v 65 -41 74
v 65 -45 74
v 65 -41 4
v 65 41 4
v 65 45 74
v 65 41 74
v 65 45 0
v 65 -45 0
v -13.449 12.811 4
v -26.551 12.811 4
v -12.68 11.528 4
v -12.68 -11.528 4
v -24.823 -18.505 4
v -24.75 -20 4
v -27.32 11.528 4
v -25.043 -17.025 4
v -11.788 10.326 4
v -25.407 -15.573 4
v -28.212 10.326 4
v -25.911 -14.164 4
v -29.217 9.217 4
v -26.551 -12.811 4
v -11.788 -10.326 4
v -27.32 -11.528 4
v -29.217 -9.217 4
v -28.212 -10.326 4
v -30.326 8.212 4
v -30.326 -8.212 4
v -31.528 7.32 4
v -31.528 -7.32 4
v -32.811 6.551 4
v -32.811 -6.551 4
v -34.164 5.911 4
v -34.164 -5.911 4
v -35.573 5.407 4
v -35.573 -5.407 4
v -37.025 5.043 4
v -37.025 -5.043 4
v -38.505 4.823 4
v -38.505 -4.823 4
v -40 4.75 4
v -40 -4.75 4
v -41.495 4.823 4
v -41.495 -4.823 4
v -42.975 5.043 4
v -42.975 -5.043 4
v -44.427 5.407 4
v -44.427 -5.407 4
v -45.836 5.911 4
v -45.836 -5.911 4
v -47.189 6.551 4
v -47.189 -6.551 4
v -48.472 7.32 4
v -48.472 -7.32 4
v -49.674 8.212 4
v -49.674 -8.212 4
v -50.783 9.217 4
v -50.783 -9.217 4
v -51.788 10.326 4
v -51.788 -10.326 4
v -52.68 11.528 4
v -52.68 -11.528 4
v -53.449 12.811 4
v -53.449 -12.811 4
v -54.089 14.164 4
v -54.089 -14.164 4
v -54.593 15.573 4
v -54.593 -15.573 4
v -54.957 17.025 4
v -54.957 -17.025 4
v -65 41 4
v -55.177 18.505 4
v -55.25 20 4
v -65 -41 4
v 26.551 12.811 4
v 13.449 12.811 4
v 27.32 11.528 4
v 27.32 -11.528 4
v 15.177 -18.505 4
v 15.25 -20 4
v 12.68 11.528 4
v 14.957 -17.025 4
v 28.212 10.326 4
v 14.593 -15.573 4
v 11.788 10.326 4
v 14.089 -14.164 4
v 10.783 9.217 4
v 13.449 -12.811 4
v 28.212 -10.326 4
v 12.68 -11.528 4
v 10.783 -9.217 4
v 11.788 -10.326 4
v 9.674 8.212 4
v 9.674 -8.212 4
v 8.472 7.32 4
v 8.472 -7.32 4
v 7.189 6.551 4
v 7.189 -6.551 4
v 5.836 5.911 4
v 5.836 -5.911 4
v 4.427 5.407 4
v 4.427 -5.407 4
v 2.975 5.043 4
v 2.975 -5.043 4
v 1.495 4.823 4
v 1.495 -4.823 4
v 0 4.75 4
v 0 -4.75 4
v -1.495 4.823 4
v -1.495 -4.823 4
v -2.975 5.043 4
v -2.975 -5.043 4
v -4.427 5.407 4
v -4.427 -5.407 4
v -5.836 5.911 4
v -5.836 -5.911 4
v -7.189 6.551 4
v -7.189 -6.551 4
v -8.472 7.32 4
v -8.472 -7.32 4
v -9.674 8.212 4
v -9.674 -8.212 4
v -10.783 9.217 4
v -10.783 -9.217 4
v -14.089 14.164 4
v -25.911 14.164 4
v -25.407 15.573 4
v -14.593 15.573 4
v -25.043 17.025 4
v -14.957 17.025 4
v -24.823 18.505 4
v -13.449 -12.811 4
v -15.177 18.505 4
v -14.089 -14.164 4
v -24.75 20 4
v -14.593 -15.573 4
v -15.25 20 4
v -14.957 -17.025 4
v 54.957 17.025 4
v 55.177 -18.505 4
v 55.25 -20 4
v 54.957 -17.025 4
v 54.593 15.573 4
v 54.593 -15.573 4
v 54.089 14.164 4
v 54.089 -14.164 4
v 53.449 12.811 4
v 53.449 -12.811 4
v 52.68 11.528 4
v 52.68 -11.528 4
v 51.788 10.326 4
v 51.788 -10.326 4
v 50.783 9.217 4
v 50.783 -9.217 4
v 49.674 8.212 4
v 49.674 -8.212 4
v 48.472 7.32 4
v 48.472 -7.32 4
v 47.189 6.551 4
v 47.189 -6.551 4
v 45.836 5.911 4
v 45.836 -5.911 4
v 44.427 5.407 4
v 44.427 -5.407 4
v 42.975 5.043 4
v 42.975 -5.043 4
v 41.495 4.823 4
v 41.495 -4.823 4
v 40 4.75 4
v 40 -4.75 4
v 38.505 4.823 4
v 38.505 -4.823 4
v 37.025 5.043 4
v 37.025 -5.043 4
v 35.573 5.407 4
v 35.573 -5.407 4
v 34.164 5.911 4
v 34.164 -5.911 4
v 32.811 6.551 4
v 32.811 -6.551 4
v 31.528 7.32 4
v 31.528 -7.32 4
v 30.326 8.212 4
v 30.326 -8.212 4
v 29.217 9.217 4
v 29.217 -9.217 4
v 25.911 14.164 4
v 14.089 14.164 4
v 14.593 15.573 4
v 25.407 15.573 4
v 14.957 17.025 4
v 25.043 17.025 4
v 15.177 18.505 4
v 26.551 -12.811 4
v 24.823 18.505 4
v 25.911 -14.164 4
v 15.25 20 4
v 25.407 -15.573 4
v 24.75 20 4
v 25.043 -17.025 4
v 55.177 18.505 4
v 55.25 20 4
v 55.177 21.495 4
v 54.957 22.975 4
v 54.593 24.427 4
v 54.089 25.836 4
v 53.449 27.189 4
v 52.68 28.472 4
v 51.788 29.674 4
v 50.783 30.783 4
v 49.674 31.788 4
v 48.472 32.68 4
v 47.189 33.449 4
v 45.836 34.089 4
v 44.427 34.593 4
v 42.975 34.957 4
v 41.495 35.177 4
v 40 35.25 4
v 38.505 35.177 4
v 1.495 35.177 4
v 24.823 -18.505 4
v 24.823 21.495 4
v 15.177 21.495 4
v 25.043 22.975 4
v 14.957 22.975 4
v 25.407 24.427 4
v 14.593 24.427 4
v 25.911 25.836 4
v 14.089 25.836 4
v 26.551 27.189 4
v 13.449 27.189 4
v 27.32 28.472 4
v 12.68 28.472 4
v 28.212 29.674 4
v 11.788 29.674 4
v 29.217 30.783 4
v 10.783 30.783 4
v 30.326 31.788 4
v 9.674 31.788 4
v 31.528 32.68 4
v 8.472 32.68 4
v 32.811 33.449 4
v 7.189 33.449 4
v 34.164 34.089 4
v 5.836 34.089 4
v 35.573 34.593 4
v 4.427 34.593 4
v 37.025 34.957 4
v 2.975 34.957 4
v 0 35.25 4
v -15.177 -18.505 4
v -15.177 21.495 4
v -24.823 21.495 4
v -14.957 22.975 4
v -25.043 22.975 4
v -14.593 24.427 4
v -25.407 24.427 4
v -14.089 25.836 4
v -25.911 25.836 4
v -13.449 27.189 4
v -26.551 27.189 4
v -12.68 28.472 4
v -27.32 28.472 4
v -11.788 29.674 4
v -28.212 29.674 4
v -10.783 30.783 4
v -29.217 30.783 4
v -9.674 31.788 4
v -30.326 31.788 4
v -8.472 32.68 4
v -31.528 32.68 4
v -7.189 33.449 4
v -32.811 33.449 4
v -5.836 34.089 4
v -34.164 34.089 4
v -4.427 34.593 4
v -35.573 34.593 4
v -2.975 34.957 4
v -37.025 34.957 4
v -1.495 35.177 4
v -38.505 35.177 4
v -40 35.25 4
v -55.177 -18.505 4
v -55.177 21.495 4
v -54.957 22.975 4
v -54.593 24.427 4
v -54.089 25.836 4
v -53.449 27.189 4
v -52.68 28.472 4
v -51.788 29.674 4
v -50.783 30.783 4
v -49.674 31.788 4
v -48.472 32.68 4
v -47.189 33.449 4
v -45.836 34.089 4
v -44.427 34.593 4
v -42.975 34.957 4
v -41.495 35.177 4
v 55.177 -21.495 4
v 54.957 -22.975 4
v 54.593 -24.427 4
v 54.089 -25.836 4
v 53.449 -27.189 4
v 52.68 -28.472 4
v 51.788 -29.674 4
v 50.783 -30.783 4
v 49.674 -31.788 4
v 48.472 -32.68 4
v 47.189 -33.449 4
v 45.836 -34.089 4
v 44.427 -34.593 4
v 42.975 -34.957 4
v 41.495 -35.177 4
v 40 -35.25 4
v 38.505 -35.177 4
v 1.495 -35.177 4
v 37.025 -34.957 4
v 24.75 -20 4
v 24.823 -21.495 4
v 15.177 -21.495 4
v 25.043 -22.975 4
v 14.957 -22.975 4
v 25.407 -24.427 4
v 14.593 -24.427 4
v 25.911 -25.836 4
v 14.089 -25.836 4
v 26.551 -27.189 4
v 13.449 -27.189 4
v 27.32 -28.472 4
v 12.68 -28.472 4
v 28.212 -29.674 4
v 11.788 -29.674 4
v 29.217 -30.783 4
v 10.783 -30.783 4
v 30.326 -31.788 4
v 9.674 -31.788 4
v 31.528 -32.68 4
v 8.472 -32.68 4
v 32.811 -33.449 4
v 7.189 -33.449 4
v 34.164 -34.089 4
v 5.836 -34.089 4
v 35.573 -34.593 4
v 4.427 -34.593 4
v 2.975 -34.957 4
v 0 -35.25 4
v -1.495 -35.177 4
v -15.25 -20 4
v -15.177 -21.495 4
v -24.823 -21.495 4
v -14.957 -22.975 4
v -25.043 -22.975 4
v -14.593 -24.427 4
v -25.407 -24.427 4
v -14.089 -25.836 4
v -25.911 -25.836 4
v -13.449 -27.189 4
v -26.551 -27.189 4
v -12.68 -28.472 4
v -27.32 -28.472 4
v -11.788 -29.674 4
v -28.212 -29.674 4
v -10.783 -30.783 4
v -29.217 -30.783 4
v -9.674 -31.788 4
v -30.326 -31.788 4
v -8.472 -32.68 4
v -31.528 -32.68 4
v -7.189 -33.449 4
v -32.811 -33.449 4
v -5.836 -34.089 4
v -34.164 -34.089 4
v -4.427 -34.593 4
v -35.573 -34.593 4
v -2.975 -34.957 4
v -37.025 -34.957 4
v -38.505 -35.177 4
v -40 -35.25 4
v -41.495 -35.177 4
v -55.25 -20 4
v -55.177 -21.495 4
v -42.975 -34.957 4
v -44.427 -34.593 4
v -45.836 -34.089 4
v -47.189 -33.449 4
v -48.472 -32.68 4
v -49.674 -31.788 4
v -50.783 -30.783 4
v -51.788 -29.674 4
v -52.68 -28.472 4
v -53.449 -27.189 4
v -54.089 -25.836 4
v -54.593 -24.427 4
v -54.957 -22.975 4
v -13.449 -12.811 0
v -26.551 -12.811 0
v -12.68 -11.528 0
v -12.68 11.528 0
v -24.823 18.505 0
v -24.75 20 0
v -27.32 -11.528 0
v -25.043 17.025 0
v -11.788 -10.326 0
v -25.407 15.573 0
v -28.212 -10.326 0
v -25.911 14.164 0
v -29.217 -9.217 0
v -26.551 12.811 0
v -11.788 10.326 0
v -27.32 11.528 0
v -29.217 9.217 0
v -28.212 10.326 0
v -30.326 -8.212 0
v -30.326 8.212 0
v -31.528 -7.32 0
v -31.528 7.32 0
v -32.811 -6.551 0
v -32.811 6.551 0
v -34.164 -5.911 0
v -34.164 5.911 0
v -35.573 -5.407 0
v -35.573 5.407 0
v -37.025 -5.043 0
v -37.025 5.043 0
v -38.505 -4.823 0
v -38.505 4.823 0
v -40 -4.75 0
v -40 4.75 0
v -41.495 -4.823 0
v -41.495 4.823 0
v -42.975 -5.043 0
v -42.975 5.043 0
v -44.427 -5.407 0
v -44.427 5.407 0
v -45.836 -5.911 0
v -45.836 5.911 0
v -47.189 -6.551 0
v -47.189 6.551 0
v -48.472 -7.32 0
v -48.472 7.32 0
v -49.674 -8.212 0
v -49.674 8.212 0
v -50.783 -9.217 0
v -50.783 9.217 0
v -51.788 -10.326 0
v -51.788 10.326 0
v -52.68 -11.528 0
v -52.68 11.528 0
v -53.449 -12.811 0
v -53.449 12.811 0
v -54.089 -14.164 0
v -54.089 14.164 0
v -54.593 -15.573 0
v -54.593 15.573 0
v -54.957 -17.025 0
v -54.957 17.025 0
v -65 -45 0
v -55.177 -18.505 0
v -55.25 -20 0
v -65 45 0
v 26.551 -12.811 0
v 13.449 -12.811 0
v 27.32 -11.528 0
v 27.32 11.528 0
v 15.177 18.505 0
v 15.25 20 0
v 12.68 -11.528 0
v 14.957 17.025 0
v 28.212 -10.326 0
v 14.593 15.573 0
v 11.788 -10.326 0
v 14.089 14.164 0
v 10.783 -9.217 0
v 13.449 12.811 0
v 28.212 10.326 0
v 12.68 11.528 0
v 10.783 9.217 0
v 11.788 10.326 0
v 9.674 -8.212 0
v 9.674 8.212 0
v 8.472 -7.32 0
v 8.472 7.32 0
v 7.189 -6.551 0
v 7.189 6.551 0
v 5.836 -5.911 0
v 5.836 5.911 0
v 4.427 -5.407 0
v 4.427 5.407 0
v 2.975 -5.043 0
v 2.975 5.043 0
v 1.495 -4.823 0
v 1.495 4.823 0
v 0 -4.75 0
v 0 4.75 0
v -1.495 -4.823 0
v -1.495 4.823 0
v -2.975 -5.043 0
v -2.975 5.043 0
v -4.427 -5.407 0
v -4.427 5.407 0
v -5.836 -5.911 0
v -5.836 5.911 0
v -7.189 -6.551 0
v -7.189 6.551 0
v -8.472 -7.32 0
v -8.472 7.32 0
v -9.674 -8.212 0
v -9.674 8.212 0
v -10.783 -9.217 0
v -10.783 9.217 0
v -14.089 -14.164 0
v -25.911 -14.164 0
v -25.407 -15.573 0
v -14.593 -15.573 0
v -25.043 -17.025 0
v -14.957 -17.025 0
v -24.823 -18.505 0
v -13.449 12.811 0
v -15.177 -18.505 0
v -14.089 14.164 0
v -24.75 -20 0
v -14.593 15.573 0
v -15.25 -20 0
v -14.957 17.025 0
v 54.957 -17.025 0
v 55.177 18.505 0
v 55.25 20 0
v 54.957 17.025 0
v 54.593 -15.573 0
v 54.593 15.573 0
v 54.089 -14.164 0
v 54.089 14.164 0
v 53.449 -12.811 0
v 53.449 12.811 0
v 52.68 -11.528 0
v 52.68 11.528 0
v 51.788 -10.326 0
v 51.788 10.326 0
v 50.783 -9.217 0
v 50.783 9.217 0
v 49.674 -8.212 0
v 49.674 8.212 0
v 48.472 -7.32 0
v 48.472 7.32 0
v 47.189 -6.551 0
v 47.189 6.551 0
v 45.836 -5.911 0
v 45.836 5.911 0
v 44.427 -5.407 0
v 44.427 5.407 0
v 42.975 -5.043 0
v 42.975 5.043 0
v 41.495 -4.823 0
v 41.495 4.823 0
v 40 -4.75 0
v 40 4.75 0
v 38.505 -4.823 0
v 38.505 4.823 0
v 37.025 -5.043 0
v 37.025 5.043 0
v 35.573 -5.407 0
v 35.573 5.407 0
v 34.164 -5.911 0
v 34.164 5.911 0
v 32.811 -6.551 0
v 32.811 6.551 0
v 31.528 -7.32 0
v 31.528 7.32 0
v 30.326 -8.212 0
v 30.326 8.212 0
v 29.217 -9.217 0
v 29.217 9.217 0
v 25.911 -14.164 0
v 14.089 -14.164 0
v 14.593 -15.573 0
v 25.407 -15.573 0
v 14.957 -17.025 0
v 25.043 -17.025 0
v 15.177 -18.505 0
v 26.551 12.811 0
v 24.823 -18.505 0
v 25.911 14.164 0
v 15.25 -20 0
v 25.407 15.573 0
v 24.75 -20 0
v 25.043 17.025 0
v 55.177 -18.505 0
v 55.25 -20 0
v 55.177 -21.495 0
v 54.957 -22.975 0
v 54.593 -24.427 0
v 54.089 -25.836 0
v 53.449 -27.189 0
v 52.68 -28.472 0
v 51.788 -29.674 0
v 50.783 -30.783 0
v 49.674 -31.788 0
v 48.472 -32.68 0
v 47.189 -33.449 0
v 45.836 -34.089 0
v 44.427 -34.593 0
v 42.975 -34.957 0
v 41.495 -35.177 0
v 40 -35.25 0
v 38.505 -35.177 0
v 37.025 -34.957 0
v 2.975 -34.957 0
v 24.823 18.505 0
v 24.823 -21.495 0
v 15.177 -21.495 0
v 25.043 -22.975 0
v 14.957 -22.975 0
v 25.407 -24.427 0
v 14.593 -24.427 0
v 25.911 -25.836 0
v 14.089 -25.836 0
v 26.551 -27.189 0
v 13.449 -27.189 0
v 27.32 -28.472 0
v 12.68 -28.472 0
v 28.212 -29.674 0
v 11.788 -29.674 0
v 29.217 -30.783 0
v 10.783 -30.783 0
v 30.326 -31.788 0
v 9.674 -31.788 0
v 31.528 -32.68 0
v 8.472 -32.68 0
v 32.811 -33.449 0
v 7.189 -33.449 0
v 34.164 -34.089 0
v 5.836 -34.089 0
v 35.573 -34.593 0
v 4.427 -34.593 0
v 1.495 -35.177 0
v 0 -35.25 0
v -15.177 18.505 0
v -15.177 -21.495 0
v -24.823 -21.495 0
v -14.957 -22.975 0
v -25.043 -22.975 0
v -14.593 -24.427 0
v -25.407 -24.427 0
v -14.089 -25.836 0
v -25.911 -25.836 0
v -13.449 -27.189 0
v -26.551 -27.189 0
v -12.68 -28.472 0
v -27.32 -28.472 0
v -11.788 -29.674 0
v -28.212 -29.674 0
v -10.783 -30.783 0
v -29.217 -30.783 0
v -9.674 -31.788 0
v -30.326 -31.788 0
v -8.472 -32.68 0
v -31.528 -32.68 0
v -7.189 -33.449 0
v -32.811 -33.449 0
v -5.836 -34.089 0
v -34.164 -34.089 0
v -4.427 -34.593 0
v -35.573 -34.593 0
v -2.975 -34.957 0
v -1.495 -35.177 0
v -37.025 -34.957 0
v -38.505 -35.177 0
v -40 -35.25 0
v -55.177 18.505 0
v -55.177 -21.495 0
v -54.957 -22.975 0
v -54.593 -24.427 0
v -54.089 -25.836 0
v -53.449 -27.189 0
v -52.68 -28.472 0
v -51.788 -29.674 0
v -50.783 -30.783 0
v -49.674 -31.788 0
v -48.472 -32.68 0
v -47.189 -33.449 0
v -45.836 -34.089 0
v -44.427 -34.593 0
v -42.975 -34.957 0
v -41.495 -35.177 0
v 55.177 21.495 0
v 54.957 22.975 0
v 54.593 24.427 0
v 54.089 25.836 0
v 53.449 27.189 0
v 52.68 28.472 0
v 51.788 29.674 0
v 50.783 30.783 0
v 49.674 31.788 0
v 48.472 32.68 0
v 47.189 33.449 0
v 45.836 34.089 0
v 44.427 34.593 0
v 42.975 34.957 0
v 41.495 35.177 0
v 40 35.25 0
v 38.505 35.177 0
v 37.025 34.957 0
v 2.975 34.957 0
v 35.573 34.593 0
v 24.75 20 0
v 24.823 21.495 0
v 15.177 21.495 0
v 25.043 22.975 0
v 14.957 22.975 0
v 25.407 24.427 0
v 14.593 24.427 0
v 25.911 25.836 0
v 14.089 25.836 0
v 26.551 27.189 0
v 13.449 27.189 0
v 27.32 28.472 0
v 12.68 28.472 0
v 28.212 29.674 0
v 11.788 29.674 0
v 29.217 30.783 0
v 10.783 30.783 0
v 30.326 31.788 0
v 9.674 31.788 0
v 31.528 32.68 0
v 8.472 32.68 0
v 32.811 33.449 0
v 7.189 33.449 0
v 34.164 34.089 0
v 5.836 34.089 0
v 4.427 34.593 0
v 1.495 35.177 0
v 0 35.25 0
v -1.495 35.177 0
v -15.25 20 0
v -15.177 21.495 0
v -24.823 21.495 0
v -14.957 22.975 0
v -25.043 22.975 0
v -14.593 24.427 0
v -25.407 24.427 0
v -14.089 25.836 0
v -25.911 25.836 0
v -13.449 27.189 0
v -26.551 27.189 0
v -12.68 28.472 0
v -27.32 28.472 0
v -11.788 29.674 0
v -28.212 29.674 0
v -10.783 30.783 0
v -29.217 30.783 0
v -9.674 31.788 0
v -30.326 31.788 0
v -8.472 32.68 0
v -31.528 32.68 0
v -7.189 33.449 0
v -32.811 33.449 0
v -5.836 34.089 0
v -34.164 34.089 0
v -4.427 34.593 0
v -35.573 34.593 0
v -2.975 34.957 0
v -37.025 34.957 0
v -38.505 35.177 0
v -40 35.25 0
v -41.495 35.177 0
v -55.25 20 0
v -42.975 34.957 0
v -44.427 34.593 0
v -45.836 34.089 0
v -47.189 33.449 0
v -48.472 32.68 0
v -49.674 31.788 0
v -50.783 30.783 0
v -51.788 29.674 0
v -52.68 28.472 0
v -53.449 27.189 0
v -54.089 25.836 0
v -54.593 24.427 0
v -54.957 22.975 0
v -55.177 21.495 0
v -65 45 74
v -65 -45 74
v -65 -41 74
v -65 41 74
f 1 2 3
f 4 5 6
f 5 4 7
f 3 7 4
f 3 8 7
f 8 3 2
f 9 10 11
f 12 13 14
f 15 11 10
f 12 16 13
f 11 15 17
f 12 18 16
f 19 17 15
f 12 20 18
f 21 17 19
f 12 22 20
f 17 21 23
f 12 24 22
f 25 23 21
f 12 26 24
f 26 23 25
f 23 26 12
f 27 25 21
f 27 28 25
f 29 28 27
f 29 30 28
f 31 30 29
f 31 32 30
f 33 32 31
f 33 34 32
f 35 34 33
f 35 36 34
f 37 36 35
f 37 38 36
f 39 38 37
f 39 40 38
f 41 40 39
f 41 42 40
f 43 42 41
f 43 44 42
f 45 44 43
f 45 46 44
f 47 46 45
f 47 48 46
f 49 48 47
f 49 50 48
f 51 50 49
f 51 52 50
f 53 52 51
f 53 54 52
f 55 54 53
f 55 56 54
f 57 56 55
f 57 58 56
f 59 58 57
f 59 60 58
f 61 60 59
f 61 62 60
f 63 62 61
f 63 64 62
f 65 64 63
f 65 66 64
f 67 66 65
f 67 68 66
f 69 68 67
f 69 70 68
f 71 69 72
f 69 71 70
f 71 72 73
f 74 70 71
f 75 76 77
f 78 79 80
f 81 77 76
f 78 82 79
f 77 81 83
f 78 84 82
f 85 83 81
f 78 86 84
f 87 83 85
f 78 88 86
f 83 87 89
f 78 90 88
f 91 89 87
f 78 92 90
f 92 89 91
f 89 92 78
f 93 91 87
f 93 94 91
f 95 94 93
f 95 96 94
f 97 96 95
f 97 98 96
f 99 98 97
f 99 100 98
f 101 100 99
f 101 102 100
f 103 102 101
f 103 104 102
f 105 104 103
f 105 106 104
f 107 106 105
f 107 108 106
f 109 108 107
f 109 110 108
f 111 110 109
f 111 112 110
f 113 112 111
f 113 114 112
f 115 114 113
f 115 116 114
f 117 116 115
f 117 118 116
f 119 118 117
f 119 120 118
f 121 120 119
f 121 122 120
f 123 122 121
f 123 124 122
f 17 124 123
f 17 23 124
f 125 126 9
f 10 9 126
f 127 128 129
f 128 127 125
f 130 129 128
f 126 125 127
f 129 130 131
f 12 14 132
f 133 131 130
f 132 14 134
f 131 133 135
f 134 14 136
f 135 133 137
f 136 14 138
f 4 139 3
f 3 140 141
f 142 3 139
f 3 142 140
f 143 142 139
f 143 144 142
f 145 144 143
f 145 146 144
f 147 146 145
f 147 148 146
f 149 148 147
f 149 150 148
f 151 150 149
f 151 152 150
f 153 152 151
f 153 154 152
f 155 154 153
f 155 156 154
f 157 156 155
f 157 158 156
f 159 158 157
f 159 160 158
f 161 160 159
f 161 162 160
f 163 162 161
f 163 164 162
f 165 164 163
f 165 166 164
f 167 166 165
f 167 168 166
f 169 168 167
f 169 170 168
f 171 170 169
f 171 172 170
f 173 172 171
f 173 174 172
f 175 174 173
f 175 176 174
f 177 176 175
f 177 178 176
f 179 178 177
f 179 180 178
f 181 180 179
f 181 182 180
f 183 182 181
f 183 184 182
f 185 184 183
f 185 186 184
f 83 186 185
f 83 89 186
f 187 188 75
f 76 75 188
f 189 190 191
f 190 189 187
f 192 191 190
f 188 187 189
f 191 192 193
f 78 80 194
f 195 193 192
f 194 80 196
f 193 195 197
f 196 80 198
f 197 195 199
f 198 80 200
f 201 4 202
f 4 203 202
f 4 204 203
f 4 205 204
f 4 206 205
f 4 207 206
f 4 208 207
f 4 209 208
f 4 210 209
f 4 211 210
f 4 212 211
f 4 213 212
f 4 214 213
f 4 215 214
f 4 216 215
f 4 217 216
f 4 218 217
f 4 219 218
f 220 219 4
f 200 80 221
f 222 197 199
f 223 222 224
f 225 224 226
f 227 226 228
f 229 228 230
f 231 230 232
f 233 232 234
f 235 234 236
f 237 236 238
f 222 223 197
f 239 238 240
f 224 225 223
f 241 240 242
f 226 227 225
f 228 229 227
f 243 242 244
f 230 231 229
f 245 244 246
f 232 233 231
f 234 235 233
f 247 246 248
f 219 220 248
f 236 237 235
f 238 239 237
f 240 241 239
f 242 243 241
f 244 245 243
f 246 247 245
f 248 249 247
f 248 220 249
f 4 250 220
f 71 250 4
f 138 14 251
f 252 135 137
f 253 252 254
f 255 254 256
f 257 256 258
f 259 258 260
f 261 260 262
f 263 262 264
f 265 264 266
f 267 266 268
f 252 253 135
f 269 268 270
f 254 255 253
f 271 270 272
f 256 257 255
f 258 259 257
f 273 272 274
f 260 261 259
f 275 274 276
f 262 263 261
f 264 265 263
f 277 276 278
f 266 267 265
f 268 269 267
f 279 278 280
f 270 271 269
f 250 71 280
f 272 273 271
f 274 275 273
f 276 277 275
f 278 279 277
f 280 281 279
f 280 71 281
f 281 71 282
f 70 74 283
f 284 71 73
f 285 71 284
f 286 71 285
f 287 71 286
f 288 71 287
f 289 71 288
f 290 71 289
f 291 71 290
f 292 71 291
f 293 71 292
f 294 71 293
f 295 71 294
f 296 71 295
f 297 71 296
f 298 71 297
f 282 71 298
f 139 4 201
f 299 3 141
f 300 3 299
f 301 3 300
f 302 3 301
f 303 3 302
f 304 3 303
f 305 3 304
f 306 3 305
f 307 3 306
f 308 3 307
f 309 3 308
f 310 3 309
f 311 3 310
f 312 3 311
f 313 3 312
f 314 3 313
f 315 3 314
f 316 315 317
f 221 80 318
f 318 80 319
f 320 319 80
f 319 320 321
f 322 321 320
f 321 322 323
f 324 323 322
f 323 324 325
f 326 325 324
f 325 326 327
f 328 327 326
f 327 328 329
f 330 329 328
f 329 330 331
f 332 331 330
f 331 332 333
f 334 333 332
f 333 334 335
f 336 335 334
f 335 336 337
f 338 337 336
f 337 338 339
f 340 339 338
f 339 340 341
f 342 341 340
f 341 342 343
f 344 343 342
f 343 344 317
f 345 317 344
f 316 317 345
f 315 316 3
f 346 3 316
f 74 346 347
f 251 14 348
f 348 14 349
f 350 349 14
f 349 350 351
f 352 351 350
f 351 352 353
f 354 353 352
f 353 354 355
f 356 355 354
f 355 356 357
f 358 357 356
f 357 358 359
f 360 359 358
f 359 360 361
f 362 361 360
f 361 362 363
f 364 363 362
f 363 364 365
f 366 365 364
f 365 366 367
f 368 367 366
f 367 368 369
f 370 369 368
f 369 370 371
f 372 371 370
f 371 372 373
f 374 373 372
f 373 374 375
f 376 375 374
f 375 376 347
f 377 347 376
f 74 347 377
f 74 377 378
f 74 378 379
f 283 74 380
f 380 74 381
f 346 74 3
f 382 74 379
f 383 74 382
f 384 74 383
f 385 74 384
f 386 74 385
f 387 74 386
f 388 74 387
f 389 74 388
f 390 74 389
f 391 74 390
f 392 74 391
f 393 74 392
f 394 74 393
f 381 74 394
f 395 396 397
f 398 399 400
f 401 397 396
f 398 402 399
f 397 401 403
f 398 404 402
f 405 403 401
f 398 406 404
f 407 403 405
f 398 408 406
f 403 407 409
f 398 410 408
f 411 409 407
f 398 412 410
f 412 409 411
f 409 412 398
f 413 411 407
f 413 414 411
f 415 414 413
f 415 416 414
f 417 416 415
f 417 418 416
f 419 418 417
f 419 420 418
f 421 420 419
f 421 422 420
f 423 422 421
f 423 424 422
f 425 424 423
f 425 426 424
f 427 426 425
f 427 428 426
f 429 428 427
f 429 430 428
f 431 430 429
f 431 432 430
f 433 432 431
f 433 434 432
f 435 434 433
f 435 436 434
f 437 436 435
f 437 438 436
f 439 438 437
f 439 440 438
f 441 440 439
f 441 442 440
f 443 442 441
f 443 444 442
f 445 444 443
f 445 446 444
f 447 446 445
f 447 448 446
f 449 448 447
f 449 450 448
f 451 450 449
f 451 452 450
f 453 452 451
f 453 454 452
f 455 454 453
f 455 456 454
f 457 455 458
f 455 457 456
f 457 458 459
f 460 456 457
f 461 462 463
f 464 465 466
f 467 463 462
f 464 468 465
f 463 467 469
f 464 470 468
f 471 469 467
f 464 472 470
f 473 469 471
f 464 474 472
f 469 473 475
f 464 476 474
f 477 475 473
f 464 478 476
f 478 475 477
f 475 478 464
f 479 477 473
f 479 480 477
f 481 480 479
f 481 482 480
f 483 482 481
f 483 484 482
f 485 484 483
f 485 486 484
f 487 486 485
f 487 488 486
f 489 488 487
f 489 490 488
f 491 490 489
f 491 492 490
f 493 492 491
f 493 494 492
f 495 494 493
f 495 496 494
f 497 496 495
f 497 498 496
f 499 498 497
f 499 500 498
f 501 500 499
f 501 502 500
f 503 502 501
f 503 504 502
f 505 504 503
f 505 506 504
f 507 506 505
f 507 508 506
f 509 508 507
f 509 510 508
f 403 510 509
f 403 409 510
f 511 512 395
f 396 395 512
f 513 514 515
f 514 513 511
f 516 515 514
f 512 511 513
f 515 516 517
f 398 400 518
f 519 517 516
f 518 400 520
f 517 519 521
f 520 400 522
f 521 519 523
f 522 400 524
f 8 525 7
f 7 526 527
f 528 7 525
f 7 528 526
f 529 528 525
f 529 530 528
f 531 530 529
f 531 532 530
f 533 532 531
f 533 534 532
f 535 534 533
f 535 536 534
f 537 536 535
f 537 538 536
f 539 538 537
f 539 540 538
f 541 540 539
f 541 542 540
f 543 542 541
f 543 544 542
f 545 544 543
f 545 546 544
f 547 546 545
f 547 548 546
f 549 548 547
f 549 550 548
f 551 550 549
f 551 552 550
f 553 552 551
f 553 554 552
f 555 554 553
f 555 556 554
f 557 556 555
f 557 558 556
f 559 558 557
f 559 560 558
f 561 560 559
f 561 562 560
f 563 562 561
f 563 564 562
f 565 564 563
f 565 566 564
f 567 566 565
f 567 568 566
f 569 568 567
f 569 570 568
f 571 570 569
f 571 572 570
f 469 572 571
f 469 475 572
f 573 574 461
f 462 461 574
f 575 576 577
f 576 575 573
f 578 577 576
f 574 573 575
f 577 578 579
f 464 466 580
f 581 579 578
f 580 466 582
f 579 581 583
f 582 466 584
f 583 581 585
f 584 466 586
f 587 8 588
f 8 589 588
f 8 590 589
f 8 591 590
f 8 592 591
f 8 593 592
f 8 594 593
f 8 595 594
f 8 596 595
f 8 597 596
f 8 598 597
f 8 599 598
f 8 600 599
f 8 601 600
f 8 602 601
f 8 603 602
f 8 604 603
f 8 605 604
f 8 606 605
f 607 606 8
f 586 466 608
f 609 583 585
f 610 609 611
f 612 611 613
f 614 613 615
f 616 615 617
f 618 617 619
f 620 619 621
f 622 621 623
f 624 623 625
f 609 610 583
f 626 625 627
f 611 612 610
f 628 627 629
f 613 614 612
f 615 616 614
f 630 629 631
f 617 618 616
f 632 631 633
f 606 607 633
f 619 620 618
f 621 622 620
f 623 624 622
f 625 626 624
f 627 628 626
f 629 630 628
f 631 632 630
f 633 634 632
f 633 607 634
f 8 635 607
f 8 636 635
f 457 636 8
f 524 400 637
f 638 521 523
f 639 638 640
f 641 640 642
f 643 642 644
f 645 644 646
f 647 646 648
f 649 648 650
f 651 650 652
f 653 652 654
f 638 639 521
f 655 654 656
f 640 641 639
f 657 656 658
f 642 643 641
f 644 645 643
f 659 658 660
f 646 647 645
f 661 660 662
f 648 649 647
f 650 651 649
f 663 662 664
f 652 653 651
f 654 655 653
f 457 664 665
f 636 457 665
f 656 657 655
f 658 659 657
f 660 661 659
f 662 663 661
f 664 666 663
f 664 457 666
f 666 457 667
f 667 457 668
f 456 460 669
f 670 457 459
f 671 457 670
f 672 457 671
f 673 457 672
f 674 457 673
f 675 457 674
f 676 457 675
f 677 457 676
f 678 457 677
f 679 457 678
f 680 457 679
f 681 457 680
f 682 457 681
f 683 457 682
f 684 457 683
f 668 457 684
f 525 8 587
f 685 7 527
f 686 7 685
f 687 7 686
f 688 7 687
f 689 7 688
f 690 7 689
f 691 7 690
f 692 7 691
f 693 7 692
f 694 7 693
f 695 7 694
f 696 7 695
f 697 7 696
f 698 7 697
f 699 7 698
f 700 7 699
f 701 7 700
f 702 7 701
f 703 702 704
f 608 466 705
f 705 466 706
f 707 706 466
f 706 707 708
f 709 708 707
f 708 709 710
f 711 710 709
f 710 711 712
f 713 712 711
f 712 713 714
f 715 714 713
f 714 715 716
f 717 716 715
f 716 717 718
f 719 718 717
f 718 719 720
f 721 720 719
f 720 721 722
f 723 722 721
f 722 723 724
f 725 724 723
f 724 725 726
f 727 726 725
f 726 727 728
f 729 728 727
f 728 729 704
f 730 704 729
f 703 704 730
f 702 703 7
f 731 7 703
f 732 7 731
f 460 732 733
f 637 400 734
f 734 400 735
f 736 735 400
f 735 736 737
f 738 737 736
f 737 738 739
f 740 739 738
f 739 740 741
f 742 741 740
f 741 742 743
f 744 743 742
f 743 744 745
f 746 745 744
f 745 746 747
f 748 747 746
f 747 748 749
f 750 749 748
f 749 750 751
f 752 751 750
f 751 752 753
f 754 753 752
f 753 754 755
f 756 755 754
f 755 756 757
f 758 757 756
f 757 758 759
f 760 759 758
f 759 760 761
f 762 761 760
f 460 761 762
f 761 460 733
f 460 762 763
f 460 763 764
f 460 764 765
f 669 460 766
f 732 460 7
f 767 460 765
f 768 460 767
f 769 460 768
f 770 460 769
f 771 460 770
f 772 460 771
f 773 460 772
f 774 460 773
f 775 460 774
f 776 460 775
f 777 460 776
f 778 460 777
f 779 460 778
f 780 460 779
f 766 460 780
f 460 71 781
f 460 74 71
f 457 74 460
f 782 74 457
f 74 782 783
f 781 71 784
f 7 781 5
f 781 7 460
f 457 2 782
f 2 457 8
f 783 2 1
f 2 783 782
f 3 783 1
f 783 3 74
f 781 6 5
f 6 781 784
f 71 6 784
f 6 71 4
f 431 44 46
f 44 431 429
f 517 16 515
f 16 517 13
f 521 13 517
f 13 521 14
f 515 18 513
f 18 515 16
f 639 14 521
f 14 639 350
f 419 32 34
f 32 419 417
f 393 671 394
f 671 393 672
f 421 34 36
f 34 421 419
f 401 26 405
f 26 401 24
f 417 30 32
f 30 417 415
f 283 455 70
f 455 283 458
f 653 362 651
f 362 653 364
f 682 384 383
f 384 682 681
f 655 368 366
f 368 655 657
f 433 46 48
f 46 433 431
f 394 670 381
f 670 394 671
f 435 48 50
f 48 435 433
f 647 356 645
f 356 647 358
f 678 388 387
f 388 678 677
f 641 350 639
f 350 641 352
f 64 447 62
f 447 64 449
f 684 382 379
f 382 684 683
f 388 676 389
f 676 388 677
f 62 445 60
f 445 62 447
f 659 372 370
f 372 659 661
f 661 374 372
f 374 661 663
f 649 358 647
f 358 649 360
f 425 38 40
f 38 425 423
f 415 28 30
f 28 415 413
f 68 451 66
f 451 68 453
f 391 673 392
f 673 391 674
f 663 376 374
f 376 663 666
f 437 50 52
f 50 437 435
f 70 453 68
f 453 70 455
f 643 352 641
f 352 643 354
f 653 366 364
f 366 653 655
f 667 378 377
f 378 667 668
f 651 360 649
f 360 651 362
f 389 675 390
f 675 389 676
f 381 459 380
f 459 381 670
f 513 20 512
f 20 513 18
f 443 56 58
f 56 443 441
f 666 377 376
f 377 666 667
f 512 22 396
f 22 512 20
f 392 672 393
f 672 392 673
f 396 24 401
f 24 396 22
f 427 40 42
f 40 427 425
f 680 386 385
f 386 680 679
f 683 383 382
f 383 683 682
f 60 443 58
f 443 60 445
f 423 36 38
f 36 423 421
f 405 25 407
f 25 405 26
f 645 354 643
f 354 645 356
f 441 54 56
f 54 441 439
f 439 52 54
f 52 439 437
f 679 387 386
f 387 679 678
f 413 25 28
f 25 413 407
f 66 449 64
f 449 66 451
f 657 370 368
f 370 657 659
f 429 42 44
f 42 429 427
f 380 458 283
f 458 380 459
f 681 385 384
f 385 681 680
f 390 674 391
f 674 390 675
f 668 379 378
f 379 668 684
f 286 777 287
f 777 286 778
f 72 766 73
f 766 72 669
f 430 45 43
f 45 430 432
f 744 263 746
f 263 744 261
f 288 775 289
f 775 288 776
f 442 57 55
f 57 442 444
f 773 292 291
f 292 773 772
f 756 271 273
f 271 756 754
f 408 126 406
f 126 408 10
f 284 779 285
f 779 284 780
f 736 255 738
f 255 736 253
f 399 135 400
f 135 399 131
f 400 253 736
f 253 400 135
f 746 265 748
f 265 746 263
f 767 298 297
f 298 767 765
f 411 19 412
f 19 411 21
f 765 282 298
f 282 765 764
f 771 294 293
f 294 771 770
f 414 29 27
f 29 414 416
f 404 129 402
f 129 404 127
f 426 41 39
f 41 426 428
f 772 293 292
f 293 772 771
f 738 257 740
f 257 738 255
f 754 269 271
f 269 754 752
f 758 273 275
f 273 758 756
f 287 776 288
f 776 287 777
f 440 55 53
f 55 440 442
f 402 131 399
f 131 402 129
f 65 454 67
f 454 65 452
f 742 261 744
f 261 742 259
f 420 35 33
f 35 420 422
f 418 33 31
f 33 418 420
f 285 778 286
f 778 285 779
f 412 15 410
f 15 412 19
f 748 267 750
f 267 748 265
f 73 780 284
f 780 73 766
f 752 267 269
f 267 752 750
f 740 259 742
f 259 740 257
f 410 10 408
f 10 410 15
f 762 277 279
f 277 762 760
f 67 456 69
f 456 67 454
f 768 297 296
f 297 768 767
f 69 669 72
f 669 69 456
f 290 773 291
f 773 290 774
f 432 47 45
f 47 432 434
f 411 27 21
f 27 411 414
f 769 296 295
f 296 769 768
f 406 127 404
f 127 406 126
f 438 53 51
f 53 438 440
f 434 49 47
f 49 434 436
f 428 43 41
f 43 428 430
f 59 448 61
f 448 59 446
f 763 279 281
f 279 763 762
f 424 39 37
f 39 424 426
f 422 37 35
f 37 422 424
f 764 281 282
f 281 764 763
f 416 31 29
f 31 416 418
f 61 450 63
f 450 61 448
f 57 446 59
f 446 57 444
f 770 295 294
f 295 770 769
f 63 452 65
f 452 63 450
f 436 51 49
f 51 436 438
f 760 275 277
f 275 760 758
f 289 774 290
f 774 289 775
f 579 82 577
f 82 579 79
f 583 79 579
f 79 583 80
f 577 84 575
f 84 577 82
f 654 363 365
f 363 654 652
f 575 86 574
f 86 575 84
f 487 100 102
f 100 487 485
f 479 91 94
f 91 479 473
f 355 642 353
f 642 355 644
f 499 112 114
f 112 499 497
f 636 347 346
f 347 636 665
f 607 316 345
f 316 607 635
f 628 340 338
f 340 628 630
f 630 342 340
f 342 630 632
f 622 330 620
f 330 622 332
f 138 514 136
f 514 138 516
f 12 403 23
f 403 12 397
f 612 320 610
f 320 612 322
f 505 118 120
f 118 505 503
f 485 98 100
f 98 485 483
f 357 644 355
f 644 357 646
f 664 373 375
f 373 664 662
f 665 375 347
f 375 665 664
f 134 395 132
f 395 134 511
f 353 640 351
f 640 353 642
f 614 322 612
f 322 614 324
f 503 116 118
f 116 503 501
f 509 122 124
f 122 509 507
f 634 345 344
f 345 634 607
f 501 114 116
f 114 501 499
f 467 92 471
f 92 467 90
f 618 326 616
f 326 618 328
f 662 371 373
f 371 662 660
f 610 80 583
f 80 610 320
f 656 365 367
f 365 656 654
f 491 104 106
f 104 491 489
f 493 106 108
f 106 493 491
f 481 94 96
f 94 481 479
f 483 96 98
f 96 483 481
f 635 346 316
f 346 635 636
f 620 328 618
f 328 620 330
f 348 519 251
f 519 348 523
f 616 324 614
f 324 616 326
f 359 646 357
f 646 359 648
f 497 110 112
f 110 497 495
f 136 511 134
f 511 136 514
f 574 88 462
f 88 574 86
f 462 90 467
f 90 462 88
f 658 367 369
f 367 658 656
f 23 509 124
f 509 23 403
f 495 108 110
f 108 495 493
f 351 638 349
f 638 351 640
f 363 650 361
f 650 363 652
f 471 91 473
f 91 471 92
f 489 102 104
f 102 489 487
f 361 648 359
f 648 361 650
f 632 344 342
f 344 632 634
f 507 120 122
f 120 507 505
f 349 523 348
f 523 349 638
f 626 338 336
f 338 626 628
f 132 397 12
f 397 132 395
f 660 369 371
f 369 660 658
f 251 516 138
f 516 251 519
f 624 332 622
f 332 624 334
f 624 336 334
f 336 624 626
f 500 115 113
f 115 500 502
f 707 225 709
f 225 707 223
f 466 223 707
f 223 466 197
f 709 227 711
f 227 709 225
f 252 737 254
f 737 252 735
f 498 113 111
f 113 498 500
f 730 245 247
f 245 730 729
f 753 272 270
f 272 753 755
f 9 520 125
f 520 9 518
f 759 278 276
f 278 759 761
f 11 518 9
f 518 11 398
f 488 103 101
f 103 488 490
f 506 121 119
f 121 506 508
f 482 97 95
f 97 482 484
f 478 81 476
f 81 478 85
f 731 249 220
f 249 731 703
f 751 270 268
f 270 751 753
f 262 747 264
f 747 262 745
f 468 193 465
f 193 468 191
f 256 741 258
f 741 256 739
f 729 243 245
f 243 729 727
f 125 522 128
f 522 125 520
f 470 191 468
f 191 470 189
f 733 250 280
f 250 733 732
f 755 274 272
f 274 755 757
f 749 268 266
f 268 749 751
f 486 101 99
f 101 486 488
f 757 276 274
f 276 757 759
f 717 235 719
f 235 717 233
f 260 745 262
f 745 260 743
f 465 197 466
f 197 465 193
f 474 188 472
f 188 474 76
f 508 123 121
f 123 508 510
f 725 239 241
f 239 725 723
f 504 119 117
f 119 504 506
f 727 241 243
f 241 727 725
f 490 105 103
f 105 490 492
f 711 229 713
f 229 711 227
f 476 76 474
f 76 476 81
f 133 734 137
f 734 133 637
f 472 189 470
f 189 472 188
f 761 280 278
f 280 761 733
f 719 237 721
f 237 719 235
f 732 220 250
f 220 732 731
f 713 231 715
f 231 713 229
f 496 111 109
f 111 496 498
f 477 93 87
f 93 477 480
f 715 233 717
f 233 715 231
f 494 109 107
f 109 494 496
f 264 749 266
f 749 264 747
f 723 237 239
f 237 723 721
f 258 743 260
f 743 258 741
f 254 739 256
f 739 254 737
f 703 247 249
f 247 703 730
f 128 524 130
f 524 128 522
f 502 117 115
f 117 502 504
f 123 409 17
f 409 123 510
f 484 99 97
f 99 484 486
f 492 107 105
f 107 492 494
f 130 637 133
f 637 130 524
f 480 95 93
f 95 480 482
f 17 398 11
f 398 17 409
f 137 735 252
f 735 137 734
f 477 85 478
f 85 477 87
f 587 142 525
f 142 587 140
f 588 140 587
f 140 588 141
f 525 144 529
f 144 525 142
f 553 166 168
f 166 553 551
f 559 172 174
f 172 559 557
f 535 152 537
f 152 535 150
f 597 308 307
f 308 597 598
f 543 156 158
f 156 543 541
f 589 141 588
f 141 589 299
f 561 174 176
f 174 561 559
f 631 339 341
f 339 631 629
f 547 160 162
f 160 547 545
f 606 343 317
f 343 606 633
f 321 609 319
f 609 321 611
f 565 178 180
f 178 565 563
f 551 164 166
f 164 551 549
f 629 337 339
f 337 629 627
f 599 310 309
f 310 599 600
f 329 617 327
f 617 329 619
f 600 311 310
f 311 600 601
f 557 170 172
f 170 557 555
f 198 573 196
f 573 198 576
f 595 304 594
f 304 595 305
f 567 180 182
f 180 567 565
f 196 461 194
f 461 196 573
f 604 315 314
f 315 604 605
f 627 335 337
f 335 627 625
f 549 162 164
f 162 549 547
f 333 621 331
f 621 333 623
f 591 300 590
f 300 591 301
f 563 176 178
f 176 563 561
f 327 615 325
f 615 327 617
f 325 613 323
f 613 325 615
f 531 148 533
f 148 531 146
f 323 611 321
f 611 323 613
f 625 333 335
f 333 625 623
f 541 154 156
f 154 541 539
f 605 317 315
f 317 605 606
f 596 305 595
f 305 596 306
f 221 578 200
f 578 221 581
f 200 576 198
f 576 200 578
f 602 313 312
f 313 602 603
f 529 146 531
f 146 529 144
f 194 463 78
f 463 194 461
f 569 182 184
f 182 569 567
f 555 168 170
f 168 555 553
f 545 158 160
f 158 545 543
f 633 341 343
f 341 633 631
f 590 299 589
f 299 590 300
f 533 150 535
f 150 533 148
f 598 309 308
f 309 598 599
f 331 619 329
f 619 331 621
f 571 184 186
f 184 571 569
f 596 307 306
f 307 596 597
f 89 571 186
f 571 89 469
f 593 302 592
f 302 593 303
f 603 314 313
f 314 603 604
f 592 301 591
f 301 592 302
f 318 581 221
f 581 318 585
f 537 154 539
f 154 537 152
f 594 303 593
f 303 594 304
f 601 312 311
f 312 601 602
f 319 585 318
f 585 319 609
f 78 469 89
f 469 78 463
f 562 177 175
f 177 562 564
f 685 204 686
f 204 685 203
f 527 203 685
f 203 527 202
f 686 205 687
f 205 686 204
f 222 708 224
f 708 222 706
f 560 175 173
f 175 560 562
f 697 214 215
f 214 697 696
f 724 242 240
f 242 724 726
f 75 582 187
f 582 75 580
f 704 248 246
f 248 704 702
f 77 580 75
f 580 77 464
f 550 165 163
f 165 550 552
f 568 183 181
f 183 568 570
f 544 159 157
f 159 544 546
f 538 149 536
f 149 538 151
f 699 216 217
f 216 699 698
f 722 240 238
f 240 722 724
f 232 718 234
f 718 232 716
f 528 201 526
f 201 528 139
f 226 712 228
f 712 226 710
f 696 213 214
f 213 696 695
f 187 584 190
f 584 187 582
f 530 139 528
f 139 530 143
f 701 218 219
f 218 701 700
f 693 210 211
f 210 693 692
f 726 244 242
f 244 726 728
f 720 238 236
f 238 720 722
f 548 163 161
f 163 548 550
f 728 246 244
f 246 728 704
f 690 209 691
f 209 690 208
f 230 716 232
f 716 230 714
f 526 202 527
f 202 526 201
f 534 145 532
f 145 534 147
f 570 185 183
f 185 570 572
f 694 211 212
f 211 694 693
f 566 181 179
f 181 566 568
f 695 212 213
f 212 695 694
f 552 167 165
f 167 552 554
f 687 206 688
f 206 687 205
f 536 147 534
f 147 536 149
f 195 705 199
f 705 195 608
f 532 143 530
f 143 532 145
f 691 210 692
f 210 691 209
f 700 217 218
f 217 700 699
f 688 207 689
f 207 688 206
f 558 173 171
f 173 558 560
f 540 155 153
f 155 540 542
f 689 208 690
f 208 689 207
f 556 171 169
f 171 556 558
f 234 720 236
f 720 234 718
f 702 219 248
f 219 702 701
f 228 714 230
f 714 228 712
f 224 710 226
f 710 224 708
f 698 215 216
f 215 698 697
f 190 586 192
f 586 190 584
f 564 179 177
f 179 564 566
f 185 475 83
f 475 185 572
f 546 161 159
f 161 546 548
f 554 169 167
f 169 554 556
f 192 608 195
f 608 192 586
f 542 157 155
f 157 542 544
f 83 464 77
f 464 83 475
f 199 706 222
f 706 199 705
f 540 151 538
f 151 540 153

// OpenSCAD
// --- Dimensions (mm) ---
plate_width = 130;          // X dimension of the base plate
plate_depth = 90;           // Y dimension of the base plate
plate_thickness = 4;        // Thickness of the base plate
wall_height = 70;           // Height of the side walls (from the top of the plate)
wall_thickness = 4;         // Thickness of the side walls
hole_diameter = 30.5;       // Diameter of the tube holes
hole_spacing_x = 40;        // Center-to-center distance along X
hole_spacing_y = 40;        // Center-to-center distance along Y
num_holes_x = 3;            // Number of holes along X axis
num_holes_y = 2;            // Number of holes along Y axis

// --- Resolution ---
$fn = 64;

// --- Construction ---

// The part is designed to be printed "upside down" relative to its final use.
// In print orientation: 
// The plate is at Z=0 to Z=4.
// The walls rise from Z=4 to Z=74 (4 + 70).
// The holes are cut through the plate.

module tube_rack() {
    difference() {
        // Main Body: The plate and the two side walls
        union() {
            // The Base Plate
            // Centered on X and Y as per instructions
            translate([-plate_width/2, -plate_depth/2, 0])
                cube([plate_width, plate_depth, plate_thickness]);
            
            // Wall 1 (along one long edge)
            // Flush with the long edge (Y = -plate_depth/2)
            translate([-plate_width/2, -plate_depth/2, plate_thickness])
                cube([plate_width, wall_thickness, wall_height]);
            
            // Wall 2 (along the other long edge)
            // Flush with the long edge (Y = plate_depth/2 - wall_thickness)
            translate([-plate_width/2, plate_depth/2 - wall_thickness, plate_thickness])
                cube([plate_width, wall_thickness, wall_height]);
        }

        // The Holes
        // Grid center is at (0, 0) because the plate is centered on the origin.
        // Offset calculation: (Total_spacing - (count-1)*spacing) / 2
        // Since we are centered on origin, we calculate the start position relative to 0.
        
        start_x = -( (num_holes_x - 1) * hole_spacing_x ) / 2;
        start_y = -( (num_holes_y - 1) * hole_spacing_y ) / 2;

        for (i = [0 : num_holes_x - 1]) {
            for (j = [0 : num_holes_y - 1]) {
                translate([
                    start_x + i * hole_spacing_x, 
                    start_y + j * hole_spacing_y, 
                    -0.01 // Slight overlap to ensure clean cut through bottom
                ])
                cylinder(d = hole_diameter, h = plate_thickness + 0.02);
            }
        }
    }
}

// Render the part
tube_rack();
